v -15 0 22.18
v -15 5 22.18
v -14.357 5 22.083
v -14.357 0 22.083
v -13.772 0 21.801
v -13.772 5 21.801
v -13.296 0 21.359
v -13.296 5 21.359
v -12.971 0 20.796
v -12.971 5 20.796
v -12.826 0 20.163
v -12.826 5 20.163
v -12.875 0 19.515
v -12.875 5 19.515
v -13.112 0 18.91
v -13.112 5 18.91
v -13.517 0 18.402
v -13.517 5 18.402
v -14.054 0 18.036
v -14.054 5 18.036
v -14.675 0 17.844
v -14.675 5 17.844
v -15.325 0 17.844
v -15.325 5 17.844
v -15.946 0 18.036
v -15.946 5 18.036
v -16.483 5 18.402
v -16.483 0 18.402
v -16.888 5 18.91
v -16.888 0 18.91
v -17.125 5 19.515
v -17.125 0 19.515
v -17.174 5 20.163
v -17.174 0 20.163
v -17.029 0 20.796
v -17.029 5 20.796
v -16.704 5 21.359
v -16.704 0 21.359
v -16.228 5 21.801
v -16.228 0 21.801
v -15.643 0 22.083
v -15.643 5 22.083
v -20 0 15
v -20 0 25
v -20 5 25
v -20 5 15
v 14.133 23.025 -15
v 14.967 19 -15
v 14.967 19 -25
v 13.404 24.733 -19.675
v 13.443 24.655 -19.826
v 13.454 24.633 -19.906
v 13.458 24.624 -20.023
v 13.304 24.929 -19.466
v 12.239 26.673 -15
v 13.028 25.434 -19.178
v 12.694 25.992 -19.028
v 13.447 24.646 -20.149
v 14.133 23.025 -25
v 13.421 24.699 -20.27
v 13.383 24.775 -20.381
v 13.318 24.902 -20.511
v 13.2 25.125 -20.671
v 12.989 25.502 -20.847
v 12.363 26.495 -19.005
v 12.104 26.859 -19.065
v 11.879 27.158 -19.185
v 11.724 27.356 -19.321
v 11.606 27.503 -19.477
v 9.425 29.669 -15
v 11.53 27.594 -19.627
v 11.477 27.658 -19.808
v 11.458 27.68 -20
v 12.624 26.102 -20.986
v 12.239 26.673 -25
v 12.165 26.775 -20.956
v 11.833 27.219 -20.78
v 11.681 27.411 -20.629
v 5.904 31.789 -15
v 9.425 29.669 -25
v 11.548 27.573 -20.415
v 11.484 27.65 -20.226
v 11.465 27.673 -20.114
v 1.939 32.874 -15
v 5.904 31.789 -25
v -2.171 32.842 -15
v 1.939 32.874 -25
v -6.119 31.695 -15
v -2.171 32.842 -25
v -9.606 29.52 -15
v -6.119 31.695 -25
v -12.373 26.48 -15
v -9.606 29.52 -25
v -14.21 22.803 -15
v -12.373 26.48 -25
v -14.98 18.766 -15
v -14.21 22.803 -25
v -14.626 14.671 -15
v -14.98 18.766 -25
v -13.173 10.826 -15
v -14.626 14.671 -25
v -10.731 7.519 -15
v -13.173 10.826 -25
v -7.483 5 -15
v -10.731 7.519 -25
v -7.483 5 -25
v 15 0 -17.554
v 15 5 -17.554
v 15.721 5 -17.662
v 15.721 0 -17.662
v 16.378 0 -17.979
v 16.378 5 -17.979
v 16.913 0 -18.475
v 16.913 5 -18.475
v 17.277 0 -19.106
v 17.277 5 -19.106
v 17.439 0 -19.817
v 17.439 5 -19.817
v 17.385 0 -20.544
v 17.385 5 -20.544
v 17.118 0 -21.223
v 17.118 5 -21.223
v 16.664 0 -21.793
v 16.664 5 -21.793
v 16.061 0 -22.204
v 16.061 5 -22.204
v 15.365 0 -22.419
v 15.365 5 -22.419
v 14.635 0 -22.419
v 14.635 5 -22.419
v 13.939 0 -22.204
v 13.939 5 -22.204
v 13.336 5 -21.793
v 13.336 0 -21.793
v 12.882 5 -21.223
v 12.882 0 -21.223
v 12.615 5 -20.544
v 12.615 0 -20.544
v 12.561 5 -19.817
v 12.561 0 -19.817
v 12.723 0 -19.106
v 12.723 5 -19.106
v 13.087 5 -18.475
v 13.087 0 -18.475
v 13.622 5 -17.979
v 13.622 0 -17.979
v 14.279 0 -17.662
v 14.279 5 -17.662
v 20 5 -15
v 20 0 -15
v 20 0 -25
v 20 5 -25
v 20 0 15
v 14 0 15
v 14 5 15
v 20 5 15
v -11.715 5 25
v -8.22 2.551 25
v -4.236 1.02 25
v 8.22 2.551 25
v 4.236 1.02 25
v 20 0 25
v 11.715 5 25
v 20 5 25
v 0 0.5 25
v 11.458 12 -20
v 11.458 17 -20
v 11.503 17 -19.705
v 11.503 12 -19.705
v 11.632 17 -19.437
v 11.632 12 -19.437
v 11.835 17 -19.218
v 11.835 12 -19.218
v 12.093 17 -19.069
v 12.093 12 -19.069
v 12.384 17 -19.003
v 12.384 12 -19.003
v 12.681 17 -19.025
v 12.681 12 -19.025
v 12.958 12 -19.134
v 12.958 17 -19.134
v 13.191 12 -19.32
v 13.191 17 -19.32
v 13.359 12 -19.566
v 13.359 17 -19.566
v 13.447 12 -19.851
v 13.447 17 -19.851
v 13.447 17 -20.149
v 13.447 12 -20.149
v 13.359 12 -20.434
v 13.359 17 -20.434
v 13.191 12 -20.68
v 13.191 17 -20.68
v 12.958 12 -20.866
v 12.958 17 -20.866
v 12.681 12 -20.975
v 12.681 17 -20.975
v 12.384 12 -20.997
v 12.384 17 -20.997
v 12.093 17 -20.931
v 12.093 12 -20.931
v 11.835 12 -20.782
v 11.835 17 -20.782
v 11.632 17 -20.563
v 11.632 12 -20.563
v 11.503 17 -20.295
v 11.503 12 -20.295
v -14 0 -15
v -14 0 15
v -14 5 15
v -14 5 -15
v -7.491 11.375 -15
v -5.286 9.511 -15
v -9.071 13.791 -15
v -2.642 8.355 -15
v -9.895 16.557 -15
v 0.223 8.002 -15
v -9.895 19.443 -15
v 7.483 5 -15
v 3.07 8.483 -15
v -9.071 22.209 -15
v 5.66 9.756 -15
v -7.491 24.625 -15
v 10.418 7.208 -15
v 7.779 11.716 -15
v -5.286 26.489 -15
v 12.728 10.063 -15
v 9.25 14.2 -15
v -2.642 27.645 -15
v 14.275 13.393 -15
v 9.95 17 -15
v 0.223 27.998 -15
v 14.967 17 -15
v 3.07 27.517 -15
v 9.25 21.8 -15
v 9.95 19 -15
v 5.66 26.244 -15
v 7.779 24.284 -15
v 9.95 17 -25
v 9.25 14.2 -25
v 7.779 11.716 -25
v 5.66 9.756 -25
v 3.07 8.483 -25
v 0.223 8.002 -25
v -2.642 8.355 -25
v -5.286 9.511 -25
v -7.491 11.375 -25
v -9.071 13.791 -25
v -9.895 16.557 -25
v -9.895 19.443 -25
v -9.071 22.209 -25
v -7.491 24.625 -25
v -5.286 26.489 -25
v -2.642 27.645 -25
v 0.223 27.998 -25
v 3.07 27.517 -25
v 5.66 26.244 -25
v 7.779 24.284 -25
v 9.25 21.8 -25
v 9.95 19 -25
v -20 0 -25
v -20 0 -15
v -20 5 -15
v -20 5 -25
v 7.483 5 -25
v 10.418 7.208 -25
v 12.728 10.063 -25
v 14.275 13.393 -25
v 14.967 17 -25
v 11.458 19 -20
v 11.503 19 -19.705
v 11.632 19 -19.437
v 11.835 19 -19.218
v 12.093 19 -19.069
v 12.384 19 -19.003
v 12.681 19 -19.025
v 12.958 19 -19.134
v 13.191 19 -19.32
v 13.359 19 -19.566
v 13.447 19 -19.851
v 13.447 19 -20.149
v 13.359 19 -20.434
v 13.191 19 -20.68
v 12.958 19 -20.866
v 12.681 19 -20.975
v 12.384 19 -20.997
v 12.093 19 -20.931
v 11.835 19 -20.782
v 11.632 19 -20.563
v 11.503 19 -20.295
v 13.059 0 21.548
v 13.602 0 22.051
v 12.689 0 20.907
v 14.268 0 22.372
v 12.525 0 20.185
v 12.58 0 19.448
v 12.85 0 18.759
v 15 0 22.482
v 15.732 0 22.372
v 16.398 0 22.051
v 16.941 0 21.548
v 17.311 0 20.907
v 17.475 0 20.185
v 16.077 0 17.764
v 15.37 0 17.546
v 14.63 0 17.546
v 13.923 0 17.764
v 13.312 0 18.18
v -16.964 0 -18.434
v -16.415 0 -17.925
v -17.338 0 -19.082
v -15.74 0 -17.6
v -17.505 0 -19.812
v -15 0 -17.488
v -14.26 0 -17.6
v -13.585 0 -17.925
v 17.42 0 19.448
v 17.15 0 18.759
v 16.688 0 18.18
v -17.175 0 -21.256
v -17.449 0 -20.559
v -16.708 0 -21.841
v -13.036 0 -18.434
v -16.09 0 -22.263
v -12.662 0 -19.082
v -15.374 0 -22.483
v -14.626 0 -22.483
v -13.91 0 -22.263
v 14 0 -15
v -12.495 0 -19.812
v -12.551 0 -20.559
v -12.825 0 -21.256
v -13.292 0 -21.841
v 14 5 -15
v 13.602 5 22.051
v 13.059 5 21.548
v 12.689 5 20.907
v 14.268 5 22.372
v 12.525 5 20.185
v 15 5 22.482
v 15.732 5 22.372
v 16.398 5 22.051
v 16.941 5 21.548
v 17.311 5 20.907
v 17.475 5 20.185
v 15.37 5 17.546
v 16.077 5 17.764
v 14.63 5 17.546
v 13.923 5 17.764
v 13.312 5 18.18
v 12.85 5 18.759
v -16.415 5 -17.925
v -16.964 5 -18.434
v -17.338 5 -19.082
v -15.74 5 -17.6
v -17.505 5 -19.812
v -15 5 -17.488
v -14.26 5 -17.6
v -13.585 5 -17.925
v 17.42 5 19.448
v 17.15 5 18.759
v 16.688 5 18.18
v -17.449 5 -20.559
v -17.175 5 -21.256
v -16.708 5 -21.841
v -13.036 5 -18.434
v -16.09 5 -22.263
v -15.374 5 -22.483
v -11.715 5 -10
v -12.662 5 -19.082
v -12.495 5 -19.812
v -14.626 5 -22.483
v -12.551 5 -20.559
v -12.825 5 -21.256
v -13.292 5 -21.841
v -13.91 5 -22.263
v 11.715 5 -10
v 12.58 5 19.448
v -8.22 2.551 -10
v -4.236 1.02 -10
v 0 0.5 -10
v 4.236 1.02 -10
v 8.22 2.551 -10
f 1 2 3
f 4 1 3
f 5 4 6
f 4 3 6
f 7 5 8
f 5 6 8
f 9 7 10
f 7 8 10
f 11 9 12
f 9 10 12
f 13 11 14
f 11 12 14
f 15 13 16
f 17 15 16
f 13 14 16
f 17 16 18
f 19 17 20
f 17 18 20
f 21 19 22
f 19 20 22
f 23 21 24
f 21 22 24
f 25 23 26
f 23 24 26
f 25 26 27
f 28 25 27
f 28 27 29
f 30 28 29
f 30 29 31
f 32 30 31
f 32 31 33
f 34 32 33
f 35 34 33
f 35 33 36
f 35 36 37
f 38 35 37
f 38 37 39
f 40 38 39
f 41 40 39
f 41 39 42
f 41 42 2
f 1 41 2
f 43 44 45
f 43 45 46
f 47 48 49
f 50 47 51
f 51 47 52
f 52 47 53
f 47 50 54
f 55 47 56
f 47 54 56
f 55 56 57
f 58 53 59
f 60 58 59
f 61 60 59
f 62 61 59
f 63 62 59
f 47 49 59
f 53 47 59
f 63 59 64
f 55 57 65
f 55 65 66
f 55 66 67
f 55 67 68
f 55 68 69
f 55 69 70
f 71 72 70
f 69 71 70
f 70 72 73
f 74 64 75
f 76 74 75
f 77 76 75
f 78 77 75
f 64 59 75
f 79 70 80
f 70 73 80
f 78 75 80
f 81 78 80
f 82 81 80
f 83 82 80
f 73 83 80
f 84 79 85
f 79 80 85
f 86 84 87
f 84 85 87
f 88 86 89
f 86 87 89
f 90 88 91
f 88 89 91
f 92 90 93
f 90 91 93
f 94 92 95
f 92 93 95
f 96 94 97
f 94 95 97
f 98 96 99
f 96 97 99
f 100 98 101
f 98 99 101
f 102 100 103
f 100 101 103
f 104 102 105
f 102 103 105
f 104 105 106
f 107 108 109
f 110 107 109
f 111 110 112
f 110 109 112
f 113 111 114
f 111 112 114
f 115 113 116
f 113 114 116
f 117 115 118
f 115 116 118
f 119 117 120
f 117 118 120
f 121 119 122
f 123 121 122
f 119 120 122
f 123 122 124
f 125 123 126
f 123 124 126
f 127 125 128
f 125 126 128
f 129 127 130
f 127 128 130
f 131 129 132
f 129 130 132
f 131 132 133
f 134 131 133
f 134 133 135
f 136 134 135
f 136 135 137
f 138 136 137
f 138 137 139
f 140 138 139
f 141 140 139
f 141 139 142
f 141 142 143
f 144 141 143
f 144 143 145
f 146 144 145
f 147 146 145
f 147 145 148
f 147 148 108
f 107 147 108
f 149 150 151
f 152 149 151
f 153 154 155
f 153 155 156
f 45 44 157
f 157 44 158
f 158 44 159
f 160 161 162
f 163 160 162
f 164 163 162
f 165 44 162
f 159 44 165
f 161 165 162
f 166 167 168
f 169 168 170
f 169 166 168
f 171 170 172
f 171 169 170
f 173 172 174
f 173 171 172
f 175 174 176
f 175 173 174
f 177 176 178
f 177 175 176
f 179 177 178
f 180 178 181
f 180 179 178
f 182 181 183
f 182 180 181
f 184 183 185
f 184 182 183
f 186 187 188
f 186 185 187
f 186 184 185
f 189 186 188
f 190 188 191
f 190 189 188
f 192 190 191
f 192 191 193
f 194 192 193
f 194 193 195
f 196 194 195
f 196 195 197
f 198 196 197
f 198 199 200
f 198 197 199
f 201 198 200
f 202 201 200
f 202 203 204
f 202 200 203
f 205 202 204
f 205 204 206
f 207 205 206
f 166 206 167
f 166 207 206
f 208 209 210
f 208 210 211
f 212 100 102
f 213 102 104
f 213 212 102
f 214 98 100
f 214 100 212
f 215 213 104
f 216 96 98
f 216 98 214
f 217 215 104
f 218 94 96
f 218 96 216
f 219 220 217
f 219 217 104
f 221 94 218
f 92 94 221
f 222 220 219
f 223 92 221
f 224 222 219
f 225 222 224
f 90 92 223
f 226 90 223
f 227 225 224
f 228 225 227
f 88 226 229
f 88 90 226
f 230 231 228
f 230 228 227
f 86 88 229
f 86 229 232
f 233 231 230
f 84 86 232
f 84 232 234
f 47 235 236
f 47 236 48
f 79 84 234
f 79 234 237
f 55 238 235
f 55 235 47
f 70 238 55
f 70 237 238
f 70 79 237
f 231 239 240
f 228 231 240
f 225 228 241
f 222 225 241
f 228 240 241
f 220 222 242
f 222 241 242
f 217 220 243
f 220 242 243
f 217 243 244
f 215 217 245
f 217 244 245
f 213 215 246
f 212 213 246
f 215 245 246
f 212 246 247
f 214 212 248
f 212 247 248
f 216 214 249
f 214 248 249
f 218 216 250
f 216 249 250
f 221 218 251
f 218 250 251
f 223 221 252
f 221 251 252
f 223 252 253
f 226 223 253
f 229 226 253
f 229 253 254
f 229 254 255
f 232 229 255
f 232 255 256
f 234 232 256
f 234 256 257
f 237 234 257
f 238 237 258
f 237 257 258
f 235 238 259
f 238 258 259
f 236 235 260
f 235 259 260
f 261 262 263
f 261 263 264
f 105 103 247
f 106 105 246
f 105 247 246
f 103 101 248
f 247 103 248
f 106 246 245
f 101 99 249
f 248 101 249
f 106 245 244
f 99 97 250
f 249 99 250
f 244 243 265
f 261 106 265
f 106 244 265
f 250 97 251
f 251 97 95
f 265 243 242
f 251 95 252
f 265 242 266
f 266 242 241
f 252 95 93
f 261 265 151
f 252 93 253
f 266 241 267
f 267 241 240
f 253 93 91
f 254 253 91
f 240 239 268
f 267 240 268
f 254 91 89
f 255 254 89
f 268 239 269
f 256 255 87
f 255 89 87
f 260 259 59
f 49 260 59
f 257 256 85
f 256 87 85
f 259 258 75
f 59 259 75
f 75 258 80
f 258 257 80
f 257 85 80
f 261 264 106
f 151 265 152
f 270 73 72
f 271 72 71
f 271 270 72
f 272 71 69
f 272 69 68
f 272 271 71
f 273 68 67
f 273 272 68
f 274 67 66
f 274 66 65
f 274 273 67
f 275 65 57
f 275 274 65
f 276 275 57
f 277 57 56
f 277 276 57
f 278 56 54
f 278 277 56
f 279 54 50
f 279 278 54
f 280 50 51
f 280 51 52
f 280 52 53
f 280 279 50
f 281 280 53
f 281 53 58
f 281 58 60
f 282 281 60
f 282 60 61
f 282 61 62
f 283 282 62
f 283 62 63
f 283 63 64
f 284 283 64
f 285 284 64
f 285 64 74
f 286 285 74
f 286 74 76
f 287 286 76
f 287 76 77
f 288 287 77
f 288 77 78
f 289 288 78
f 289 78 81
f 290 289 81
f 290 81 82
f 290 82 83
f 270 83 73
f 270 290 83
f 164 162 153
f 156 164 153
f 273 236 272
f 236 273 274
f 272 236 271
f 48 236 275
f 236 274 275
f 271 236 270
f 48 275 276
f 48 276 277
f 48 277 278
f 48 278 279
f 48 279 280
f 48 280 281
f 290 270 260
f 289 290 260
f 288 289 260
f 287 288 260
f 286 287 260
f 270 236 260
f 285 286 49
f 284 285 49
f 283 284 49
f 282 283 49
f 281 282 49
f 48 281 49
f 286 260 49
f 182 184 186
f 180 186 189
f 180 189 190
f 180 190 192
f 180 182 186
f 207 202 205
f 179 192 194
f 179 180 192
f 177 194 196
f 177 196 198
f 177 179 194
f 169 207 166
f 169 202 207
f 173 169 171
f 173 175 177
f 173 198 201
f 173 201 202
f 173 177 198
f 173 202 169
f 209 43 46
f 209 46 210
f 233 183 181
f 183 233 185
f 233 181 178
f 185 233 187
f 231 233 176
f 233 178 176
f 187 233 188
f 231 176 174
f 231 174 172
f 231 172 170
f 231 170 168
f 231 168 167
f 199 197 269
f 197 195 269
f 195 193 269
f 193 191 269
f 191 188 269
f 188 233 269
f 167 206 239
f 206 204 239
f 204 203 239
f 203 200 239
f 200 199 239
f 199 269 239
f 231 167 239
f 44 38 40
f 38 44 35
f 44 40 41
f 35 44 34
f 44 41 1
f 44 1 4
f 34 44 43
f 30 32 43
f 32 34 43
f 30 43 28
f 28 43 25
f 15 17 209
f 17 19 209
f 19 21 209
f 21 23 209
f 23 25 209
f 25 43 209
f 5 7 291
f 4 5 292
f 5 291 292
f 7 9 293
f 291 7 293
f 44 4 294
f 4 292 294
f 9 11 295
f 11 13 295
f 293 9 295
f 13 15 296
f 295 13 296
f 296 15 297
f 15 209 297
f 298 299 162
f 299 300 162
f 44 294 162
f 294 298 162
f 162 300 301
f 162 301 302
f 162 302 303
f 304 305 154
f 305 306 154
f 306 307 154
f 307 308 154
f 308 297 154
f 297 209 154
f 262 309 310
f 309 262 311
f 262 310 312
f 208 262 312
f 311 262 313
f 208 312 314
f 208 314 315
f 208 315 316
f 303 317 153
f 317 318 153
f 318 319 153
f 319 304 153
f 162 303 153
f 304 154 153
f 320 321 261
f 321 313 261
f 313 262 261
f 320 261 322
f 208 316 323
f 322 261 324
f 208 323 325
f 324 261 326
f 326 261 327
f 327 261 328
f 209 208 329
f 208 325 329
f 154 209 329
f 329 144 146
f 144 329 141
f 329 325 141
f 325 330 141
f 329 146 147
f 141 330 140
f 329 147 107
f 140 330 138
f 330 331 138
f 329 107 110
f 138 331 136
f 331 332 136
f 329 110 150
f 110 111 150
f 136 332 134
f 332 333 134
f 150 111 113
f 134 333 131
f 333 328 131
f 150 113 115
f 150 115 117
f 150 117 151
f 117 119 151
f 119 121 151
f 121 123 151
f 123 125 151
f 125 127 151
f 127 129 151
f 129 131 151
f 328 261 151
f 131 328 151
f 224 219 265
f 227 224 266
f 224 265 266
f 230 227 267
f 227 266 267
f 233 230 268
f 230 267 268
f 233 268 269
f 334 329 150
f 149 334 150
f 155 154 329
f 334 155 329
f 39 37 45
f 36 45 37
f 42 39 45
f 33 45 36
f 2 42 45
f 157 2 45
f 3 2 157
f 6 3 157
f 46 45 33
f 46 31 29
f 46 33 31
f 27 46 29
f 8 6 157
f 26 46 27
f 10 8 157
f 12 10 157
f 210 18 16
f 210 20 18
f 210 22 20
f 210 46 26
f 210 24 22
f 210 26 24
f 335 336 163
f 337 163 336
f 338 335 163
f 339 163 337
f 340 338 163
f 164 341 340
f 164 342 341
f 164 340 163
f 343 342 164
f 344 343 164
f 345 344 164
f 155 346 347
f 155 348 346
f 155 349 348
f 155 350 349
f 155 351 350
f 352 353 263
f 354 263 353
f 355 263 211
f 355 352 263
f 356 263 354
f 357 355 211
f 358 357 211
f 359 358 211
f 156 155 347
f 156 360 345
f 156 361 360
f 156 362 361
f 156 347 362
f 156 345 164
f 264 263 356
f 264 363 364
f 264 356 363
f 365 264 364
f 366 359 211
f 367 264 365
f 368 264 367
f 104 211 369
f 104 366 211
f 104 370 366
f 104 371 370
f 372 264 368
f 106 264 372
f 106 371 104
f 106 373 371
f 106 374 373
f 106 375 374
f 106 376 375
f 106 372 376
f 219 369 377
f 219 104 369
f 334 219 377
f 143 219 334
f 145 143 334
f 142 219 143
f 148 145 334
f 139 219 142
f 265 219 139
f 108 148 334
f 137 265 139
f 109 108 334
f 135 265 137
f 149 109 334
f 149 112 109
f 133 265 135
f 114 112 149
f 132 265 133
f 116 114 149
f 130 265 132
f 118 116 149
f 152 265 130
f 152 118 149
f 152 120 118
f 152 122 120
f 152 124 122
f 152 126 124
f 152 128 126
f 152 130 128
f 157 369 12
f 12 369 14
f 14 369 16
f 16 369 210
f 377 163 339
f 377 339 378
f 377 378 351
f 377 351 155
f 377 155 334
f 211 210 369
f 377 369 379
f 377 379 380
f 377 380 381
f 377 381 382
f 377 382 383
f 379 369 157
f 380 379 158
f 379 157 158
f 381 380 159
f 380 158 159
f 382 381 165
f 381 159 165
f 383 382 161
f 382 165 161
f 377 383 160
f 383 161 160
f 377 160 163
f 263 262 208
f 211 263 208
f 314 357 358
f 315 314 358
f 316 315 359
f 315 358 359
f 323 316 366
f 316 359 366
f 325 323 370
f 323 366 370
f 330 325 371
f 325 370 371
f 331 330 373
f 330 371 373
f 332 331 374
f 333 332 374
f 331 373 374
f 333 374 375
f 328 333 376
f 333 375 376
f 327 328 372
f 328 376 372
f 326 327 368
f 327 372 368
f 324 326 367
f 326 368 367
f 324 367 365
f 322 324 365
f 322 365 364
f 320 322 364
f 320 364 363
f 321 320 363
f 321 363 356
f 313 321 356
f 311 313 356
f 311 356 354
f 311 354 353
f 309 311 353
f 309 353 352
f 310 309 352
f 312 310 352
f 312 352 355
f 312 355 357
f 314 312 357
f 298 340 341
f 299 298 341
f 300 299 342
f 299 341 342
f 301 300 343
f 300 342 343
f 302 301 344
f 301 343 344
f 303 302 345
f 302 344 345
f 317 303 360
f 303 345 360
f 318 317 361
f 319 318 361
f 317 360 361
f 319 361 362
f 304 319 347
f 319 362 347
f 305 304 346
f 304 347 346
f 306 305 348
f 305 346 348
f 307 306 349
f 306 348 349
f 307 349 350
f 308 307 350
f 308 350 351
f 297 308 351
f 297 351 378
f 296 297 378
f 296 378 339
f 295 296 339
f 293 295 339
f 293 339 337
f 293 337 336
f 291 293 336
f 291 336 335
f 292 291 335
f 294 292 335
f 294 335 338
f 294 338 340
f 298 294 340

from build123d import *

# Parameters (mm, degrees)
SKETCH1_W               = 6
SKETCH1_H               = 10
SKETCH1_W_2             = 28
SKETCH1_H_2             = 50
BOSS_EXTRUDE1_DEPTH     = 5
BOSS_EXTRUDE2_DEPTH     = 10
SKETCH4_R               = 17.5
CUT_EXTRUDE1_DEPTH      = 35
CUT_EXTRUDE2_DEPTH      = 30
CUT_EXTRUDE2_DEPTH_BACK = 5
SKETCH6_R               = 1
SKETCH5_R               = 2.179957699
SKETCH5_R_2             = 2.482189609
SKETCH5_R_3             = 2.446214892
SKETCH5_R_4             = 2.511545909
CUT_EXTRUDE3_DEPTH      = 30


with BuildPart() as part:
    # Sketch1 → Boss-Extrude1 (new body)
    with BuildSketch(Plane(origin=(0, 0, 0), x_dir=(1, 0, 0), z_dir=(0, 1, 0))):
        with Locations((-17, -20)):
            Rectangle(SKETCH1_W, SKETCH1_H)
        Rectangle(SKETCH1_W_2, SKETCH1_H_2)
        with Locations((-17, 20)):
            Rectangle(SKETCH1_W, SKETCH1_H)
        with Locations((17, 20)):
            Rectangle(SKETCH1_W, SKETCH1_H)
        with Locations((17, -20)):
            Rectangle(SKETCH1_W, SKETCH1_H)
    extrude(amount=BOSS_EXTRUDE1_DEPTH)

    # Sketch2 → Boss-Extrude2 (add)
    with BuildSketch(Plane(origin=(0, 0, -25), x_dir=(-1, 0, 0), z_dir=(0, 0, -1))):
        with BuildLine():
            Line((-9.949874371, 19), (-14.966629547, 19))
            ThreePointArc((-14.966629547, 19), (15, 18), (-14.966629547, 17))
            Line((-14.966629547, 17), (-9.949874371, 17))
            ThreePointArc((-9.949874371, 17), (10, 18), (-9.949874371, 19))
        make_face()
    extrude(amount=-BOSS_EXTRUDE2_DEPTH)

    # Sketch4 → Cut-Extrude1 (cut)
    with BuildSketch(Plane.XY.offset(25)):
        with Locations((0, 18)):
            Circle(SKETCH4_R)
    extrude(amount=-CUT_EXTRUDE1_DEPTH, mode=Mode.SUBTRACT)

    # Sketch6 → Cut-Extrude2 (cut, two sides: drawn at the far end of the back side and taken through both)
    with BuildSketch(Plane(origin=(0, 17, 0), x_dir=(1, 0, 0), z_dir=(0, 1, 0)).offset(-CUT_EXTRUDE2_DEPTH_BACK)):
        with Locations(Location((12.458251959, 20, 0), (0, 0, 180))):
            Circle(SKETCH6_R)
    extrude(amount=CUT_EXTRUDE2_DEPTH + CUT_EXTRUDE2_DEPTH_BACK, mode=Mode.SUBTRACT)

    # Sketch5 → Cut-Extrude3 (cut)
    with BuildSketch(Plane(origin=(0, 5, 0), x_dir=(1, 0, 0), z_dir=(0, 1, 0))):
        with Locations(Location((-15, -20, 0), (0, 0, 270))):
            Circle(SKETCH5_R)
        with Locations(Location((15, -20, 0), (0, 0, 270))):
            Circle(SKETCH5_R_2)
        with Locations(Location((15, 20, 0), (0, 0, 270))):
            Circle(SKETCH5_R_3)
        with Locations(Location((-15, 20, 0), (0, 0, 270))):
            Circle(SKETCH5_R_4)
    extrude(amount=-CUT_EXTRUDE3_DEPTH, mode=Mode.SUBTRACT)


solid = part.part
